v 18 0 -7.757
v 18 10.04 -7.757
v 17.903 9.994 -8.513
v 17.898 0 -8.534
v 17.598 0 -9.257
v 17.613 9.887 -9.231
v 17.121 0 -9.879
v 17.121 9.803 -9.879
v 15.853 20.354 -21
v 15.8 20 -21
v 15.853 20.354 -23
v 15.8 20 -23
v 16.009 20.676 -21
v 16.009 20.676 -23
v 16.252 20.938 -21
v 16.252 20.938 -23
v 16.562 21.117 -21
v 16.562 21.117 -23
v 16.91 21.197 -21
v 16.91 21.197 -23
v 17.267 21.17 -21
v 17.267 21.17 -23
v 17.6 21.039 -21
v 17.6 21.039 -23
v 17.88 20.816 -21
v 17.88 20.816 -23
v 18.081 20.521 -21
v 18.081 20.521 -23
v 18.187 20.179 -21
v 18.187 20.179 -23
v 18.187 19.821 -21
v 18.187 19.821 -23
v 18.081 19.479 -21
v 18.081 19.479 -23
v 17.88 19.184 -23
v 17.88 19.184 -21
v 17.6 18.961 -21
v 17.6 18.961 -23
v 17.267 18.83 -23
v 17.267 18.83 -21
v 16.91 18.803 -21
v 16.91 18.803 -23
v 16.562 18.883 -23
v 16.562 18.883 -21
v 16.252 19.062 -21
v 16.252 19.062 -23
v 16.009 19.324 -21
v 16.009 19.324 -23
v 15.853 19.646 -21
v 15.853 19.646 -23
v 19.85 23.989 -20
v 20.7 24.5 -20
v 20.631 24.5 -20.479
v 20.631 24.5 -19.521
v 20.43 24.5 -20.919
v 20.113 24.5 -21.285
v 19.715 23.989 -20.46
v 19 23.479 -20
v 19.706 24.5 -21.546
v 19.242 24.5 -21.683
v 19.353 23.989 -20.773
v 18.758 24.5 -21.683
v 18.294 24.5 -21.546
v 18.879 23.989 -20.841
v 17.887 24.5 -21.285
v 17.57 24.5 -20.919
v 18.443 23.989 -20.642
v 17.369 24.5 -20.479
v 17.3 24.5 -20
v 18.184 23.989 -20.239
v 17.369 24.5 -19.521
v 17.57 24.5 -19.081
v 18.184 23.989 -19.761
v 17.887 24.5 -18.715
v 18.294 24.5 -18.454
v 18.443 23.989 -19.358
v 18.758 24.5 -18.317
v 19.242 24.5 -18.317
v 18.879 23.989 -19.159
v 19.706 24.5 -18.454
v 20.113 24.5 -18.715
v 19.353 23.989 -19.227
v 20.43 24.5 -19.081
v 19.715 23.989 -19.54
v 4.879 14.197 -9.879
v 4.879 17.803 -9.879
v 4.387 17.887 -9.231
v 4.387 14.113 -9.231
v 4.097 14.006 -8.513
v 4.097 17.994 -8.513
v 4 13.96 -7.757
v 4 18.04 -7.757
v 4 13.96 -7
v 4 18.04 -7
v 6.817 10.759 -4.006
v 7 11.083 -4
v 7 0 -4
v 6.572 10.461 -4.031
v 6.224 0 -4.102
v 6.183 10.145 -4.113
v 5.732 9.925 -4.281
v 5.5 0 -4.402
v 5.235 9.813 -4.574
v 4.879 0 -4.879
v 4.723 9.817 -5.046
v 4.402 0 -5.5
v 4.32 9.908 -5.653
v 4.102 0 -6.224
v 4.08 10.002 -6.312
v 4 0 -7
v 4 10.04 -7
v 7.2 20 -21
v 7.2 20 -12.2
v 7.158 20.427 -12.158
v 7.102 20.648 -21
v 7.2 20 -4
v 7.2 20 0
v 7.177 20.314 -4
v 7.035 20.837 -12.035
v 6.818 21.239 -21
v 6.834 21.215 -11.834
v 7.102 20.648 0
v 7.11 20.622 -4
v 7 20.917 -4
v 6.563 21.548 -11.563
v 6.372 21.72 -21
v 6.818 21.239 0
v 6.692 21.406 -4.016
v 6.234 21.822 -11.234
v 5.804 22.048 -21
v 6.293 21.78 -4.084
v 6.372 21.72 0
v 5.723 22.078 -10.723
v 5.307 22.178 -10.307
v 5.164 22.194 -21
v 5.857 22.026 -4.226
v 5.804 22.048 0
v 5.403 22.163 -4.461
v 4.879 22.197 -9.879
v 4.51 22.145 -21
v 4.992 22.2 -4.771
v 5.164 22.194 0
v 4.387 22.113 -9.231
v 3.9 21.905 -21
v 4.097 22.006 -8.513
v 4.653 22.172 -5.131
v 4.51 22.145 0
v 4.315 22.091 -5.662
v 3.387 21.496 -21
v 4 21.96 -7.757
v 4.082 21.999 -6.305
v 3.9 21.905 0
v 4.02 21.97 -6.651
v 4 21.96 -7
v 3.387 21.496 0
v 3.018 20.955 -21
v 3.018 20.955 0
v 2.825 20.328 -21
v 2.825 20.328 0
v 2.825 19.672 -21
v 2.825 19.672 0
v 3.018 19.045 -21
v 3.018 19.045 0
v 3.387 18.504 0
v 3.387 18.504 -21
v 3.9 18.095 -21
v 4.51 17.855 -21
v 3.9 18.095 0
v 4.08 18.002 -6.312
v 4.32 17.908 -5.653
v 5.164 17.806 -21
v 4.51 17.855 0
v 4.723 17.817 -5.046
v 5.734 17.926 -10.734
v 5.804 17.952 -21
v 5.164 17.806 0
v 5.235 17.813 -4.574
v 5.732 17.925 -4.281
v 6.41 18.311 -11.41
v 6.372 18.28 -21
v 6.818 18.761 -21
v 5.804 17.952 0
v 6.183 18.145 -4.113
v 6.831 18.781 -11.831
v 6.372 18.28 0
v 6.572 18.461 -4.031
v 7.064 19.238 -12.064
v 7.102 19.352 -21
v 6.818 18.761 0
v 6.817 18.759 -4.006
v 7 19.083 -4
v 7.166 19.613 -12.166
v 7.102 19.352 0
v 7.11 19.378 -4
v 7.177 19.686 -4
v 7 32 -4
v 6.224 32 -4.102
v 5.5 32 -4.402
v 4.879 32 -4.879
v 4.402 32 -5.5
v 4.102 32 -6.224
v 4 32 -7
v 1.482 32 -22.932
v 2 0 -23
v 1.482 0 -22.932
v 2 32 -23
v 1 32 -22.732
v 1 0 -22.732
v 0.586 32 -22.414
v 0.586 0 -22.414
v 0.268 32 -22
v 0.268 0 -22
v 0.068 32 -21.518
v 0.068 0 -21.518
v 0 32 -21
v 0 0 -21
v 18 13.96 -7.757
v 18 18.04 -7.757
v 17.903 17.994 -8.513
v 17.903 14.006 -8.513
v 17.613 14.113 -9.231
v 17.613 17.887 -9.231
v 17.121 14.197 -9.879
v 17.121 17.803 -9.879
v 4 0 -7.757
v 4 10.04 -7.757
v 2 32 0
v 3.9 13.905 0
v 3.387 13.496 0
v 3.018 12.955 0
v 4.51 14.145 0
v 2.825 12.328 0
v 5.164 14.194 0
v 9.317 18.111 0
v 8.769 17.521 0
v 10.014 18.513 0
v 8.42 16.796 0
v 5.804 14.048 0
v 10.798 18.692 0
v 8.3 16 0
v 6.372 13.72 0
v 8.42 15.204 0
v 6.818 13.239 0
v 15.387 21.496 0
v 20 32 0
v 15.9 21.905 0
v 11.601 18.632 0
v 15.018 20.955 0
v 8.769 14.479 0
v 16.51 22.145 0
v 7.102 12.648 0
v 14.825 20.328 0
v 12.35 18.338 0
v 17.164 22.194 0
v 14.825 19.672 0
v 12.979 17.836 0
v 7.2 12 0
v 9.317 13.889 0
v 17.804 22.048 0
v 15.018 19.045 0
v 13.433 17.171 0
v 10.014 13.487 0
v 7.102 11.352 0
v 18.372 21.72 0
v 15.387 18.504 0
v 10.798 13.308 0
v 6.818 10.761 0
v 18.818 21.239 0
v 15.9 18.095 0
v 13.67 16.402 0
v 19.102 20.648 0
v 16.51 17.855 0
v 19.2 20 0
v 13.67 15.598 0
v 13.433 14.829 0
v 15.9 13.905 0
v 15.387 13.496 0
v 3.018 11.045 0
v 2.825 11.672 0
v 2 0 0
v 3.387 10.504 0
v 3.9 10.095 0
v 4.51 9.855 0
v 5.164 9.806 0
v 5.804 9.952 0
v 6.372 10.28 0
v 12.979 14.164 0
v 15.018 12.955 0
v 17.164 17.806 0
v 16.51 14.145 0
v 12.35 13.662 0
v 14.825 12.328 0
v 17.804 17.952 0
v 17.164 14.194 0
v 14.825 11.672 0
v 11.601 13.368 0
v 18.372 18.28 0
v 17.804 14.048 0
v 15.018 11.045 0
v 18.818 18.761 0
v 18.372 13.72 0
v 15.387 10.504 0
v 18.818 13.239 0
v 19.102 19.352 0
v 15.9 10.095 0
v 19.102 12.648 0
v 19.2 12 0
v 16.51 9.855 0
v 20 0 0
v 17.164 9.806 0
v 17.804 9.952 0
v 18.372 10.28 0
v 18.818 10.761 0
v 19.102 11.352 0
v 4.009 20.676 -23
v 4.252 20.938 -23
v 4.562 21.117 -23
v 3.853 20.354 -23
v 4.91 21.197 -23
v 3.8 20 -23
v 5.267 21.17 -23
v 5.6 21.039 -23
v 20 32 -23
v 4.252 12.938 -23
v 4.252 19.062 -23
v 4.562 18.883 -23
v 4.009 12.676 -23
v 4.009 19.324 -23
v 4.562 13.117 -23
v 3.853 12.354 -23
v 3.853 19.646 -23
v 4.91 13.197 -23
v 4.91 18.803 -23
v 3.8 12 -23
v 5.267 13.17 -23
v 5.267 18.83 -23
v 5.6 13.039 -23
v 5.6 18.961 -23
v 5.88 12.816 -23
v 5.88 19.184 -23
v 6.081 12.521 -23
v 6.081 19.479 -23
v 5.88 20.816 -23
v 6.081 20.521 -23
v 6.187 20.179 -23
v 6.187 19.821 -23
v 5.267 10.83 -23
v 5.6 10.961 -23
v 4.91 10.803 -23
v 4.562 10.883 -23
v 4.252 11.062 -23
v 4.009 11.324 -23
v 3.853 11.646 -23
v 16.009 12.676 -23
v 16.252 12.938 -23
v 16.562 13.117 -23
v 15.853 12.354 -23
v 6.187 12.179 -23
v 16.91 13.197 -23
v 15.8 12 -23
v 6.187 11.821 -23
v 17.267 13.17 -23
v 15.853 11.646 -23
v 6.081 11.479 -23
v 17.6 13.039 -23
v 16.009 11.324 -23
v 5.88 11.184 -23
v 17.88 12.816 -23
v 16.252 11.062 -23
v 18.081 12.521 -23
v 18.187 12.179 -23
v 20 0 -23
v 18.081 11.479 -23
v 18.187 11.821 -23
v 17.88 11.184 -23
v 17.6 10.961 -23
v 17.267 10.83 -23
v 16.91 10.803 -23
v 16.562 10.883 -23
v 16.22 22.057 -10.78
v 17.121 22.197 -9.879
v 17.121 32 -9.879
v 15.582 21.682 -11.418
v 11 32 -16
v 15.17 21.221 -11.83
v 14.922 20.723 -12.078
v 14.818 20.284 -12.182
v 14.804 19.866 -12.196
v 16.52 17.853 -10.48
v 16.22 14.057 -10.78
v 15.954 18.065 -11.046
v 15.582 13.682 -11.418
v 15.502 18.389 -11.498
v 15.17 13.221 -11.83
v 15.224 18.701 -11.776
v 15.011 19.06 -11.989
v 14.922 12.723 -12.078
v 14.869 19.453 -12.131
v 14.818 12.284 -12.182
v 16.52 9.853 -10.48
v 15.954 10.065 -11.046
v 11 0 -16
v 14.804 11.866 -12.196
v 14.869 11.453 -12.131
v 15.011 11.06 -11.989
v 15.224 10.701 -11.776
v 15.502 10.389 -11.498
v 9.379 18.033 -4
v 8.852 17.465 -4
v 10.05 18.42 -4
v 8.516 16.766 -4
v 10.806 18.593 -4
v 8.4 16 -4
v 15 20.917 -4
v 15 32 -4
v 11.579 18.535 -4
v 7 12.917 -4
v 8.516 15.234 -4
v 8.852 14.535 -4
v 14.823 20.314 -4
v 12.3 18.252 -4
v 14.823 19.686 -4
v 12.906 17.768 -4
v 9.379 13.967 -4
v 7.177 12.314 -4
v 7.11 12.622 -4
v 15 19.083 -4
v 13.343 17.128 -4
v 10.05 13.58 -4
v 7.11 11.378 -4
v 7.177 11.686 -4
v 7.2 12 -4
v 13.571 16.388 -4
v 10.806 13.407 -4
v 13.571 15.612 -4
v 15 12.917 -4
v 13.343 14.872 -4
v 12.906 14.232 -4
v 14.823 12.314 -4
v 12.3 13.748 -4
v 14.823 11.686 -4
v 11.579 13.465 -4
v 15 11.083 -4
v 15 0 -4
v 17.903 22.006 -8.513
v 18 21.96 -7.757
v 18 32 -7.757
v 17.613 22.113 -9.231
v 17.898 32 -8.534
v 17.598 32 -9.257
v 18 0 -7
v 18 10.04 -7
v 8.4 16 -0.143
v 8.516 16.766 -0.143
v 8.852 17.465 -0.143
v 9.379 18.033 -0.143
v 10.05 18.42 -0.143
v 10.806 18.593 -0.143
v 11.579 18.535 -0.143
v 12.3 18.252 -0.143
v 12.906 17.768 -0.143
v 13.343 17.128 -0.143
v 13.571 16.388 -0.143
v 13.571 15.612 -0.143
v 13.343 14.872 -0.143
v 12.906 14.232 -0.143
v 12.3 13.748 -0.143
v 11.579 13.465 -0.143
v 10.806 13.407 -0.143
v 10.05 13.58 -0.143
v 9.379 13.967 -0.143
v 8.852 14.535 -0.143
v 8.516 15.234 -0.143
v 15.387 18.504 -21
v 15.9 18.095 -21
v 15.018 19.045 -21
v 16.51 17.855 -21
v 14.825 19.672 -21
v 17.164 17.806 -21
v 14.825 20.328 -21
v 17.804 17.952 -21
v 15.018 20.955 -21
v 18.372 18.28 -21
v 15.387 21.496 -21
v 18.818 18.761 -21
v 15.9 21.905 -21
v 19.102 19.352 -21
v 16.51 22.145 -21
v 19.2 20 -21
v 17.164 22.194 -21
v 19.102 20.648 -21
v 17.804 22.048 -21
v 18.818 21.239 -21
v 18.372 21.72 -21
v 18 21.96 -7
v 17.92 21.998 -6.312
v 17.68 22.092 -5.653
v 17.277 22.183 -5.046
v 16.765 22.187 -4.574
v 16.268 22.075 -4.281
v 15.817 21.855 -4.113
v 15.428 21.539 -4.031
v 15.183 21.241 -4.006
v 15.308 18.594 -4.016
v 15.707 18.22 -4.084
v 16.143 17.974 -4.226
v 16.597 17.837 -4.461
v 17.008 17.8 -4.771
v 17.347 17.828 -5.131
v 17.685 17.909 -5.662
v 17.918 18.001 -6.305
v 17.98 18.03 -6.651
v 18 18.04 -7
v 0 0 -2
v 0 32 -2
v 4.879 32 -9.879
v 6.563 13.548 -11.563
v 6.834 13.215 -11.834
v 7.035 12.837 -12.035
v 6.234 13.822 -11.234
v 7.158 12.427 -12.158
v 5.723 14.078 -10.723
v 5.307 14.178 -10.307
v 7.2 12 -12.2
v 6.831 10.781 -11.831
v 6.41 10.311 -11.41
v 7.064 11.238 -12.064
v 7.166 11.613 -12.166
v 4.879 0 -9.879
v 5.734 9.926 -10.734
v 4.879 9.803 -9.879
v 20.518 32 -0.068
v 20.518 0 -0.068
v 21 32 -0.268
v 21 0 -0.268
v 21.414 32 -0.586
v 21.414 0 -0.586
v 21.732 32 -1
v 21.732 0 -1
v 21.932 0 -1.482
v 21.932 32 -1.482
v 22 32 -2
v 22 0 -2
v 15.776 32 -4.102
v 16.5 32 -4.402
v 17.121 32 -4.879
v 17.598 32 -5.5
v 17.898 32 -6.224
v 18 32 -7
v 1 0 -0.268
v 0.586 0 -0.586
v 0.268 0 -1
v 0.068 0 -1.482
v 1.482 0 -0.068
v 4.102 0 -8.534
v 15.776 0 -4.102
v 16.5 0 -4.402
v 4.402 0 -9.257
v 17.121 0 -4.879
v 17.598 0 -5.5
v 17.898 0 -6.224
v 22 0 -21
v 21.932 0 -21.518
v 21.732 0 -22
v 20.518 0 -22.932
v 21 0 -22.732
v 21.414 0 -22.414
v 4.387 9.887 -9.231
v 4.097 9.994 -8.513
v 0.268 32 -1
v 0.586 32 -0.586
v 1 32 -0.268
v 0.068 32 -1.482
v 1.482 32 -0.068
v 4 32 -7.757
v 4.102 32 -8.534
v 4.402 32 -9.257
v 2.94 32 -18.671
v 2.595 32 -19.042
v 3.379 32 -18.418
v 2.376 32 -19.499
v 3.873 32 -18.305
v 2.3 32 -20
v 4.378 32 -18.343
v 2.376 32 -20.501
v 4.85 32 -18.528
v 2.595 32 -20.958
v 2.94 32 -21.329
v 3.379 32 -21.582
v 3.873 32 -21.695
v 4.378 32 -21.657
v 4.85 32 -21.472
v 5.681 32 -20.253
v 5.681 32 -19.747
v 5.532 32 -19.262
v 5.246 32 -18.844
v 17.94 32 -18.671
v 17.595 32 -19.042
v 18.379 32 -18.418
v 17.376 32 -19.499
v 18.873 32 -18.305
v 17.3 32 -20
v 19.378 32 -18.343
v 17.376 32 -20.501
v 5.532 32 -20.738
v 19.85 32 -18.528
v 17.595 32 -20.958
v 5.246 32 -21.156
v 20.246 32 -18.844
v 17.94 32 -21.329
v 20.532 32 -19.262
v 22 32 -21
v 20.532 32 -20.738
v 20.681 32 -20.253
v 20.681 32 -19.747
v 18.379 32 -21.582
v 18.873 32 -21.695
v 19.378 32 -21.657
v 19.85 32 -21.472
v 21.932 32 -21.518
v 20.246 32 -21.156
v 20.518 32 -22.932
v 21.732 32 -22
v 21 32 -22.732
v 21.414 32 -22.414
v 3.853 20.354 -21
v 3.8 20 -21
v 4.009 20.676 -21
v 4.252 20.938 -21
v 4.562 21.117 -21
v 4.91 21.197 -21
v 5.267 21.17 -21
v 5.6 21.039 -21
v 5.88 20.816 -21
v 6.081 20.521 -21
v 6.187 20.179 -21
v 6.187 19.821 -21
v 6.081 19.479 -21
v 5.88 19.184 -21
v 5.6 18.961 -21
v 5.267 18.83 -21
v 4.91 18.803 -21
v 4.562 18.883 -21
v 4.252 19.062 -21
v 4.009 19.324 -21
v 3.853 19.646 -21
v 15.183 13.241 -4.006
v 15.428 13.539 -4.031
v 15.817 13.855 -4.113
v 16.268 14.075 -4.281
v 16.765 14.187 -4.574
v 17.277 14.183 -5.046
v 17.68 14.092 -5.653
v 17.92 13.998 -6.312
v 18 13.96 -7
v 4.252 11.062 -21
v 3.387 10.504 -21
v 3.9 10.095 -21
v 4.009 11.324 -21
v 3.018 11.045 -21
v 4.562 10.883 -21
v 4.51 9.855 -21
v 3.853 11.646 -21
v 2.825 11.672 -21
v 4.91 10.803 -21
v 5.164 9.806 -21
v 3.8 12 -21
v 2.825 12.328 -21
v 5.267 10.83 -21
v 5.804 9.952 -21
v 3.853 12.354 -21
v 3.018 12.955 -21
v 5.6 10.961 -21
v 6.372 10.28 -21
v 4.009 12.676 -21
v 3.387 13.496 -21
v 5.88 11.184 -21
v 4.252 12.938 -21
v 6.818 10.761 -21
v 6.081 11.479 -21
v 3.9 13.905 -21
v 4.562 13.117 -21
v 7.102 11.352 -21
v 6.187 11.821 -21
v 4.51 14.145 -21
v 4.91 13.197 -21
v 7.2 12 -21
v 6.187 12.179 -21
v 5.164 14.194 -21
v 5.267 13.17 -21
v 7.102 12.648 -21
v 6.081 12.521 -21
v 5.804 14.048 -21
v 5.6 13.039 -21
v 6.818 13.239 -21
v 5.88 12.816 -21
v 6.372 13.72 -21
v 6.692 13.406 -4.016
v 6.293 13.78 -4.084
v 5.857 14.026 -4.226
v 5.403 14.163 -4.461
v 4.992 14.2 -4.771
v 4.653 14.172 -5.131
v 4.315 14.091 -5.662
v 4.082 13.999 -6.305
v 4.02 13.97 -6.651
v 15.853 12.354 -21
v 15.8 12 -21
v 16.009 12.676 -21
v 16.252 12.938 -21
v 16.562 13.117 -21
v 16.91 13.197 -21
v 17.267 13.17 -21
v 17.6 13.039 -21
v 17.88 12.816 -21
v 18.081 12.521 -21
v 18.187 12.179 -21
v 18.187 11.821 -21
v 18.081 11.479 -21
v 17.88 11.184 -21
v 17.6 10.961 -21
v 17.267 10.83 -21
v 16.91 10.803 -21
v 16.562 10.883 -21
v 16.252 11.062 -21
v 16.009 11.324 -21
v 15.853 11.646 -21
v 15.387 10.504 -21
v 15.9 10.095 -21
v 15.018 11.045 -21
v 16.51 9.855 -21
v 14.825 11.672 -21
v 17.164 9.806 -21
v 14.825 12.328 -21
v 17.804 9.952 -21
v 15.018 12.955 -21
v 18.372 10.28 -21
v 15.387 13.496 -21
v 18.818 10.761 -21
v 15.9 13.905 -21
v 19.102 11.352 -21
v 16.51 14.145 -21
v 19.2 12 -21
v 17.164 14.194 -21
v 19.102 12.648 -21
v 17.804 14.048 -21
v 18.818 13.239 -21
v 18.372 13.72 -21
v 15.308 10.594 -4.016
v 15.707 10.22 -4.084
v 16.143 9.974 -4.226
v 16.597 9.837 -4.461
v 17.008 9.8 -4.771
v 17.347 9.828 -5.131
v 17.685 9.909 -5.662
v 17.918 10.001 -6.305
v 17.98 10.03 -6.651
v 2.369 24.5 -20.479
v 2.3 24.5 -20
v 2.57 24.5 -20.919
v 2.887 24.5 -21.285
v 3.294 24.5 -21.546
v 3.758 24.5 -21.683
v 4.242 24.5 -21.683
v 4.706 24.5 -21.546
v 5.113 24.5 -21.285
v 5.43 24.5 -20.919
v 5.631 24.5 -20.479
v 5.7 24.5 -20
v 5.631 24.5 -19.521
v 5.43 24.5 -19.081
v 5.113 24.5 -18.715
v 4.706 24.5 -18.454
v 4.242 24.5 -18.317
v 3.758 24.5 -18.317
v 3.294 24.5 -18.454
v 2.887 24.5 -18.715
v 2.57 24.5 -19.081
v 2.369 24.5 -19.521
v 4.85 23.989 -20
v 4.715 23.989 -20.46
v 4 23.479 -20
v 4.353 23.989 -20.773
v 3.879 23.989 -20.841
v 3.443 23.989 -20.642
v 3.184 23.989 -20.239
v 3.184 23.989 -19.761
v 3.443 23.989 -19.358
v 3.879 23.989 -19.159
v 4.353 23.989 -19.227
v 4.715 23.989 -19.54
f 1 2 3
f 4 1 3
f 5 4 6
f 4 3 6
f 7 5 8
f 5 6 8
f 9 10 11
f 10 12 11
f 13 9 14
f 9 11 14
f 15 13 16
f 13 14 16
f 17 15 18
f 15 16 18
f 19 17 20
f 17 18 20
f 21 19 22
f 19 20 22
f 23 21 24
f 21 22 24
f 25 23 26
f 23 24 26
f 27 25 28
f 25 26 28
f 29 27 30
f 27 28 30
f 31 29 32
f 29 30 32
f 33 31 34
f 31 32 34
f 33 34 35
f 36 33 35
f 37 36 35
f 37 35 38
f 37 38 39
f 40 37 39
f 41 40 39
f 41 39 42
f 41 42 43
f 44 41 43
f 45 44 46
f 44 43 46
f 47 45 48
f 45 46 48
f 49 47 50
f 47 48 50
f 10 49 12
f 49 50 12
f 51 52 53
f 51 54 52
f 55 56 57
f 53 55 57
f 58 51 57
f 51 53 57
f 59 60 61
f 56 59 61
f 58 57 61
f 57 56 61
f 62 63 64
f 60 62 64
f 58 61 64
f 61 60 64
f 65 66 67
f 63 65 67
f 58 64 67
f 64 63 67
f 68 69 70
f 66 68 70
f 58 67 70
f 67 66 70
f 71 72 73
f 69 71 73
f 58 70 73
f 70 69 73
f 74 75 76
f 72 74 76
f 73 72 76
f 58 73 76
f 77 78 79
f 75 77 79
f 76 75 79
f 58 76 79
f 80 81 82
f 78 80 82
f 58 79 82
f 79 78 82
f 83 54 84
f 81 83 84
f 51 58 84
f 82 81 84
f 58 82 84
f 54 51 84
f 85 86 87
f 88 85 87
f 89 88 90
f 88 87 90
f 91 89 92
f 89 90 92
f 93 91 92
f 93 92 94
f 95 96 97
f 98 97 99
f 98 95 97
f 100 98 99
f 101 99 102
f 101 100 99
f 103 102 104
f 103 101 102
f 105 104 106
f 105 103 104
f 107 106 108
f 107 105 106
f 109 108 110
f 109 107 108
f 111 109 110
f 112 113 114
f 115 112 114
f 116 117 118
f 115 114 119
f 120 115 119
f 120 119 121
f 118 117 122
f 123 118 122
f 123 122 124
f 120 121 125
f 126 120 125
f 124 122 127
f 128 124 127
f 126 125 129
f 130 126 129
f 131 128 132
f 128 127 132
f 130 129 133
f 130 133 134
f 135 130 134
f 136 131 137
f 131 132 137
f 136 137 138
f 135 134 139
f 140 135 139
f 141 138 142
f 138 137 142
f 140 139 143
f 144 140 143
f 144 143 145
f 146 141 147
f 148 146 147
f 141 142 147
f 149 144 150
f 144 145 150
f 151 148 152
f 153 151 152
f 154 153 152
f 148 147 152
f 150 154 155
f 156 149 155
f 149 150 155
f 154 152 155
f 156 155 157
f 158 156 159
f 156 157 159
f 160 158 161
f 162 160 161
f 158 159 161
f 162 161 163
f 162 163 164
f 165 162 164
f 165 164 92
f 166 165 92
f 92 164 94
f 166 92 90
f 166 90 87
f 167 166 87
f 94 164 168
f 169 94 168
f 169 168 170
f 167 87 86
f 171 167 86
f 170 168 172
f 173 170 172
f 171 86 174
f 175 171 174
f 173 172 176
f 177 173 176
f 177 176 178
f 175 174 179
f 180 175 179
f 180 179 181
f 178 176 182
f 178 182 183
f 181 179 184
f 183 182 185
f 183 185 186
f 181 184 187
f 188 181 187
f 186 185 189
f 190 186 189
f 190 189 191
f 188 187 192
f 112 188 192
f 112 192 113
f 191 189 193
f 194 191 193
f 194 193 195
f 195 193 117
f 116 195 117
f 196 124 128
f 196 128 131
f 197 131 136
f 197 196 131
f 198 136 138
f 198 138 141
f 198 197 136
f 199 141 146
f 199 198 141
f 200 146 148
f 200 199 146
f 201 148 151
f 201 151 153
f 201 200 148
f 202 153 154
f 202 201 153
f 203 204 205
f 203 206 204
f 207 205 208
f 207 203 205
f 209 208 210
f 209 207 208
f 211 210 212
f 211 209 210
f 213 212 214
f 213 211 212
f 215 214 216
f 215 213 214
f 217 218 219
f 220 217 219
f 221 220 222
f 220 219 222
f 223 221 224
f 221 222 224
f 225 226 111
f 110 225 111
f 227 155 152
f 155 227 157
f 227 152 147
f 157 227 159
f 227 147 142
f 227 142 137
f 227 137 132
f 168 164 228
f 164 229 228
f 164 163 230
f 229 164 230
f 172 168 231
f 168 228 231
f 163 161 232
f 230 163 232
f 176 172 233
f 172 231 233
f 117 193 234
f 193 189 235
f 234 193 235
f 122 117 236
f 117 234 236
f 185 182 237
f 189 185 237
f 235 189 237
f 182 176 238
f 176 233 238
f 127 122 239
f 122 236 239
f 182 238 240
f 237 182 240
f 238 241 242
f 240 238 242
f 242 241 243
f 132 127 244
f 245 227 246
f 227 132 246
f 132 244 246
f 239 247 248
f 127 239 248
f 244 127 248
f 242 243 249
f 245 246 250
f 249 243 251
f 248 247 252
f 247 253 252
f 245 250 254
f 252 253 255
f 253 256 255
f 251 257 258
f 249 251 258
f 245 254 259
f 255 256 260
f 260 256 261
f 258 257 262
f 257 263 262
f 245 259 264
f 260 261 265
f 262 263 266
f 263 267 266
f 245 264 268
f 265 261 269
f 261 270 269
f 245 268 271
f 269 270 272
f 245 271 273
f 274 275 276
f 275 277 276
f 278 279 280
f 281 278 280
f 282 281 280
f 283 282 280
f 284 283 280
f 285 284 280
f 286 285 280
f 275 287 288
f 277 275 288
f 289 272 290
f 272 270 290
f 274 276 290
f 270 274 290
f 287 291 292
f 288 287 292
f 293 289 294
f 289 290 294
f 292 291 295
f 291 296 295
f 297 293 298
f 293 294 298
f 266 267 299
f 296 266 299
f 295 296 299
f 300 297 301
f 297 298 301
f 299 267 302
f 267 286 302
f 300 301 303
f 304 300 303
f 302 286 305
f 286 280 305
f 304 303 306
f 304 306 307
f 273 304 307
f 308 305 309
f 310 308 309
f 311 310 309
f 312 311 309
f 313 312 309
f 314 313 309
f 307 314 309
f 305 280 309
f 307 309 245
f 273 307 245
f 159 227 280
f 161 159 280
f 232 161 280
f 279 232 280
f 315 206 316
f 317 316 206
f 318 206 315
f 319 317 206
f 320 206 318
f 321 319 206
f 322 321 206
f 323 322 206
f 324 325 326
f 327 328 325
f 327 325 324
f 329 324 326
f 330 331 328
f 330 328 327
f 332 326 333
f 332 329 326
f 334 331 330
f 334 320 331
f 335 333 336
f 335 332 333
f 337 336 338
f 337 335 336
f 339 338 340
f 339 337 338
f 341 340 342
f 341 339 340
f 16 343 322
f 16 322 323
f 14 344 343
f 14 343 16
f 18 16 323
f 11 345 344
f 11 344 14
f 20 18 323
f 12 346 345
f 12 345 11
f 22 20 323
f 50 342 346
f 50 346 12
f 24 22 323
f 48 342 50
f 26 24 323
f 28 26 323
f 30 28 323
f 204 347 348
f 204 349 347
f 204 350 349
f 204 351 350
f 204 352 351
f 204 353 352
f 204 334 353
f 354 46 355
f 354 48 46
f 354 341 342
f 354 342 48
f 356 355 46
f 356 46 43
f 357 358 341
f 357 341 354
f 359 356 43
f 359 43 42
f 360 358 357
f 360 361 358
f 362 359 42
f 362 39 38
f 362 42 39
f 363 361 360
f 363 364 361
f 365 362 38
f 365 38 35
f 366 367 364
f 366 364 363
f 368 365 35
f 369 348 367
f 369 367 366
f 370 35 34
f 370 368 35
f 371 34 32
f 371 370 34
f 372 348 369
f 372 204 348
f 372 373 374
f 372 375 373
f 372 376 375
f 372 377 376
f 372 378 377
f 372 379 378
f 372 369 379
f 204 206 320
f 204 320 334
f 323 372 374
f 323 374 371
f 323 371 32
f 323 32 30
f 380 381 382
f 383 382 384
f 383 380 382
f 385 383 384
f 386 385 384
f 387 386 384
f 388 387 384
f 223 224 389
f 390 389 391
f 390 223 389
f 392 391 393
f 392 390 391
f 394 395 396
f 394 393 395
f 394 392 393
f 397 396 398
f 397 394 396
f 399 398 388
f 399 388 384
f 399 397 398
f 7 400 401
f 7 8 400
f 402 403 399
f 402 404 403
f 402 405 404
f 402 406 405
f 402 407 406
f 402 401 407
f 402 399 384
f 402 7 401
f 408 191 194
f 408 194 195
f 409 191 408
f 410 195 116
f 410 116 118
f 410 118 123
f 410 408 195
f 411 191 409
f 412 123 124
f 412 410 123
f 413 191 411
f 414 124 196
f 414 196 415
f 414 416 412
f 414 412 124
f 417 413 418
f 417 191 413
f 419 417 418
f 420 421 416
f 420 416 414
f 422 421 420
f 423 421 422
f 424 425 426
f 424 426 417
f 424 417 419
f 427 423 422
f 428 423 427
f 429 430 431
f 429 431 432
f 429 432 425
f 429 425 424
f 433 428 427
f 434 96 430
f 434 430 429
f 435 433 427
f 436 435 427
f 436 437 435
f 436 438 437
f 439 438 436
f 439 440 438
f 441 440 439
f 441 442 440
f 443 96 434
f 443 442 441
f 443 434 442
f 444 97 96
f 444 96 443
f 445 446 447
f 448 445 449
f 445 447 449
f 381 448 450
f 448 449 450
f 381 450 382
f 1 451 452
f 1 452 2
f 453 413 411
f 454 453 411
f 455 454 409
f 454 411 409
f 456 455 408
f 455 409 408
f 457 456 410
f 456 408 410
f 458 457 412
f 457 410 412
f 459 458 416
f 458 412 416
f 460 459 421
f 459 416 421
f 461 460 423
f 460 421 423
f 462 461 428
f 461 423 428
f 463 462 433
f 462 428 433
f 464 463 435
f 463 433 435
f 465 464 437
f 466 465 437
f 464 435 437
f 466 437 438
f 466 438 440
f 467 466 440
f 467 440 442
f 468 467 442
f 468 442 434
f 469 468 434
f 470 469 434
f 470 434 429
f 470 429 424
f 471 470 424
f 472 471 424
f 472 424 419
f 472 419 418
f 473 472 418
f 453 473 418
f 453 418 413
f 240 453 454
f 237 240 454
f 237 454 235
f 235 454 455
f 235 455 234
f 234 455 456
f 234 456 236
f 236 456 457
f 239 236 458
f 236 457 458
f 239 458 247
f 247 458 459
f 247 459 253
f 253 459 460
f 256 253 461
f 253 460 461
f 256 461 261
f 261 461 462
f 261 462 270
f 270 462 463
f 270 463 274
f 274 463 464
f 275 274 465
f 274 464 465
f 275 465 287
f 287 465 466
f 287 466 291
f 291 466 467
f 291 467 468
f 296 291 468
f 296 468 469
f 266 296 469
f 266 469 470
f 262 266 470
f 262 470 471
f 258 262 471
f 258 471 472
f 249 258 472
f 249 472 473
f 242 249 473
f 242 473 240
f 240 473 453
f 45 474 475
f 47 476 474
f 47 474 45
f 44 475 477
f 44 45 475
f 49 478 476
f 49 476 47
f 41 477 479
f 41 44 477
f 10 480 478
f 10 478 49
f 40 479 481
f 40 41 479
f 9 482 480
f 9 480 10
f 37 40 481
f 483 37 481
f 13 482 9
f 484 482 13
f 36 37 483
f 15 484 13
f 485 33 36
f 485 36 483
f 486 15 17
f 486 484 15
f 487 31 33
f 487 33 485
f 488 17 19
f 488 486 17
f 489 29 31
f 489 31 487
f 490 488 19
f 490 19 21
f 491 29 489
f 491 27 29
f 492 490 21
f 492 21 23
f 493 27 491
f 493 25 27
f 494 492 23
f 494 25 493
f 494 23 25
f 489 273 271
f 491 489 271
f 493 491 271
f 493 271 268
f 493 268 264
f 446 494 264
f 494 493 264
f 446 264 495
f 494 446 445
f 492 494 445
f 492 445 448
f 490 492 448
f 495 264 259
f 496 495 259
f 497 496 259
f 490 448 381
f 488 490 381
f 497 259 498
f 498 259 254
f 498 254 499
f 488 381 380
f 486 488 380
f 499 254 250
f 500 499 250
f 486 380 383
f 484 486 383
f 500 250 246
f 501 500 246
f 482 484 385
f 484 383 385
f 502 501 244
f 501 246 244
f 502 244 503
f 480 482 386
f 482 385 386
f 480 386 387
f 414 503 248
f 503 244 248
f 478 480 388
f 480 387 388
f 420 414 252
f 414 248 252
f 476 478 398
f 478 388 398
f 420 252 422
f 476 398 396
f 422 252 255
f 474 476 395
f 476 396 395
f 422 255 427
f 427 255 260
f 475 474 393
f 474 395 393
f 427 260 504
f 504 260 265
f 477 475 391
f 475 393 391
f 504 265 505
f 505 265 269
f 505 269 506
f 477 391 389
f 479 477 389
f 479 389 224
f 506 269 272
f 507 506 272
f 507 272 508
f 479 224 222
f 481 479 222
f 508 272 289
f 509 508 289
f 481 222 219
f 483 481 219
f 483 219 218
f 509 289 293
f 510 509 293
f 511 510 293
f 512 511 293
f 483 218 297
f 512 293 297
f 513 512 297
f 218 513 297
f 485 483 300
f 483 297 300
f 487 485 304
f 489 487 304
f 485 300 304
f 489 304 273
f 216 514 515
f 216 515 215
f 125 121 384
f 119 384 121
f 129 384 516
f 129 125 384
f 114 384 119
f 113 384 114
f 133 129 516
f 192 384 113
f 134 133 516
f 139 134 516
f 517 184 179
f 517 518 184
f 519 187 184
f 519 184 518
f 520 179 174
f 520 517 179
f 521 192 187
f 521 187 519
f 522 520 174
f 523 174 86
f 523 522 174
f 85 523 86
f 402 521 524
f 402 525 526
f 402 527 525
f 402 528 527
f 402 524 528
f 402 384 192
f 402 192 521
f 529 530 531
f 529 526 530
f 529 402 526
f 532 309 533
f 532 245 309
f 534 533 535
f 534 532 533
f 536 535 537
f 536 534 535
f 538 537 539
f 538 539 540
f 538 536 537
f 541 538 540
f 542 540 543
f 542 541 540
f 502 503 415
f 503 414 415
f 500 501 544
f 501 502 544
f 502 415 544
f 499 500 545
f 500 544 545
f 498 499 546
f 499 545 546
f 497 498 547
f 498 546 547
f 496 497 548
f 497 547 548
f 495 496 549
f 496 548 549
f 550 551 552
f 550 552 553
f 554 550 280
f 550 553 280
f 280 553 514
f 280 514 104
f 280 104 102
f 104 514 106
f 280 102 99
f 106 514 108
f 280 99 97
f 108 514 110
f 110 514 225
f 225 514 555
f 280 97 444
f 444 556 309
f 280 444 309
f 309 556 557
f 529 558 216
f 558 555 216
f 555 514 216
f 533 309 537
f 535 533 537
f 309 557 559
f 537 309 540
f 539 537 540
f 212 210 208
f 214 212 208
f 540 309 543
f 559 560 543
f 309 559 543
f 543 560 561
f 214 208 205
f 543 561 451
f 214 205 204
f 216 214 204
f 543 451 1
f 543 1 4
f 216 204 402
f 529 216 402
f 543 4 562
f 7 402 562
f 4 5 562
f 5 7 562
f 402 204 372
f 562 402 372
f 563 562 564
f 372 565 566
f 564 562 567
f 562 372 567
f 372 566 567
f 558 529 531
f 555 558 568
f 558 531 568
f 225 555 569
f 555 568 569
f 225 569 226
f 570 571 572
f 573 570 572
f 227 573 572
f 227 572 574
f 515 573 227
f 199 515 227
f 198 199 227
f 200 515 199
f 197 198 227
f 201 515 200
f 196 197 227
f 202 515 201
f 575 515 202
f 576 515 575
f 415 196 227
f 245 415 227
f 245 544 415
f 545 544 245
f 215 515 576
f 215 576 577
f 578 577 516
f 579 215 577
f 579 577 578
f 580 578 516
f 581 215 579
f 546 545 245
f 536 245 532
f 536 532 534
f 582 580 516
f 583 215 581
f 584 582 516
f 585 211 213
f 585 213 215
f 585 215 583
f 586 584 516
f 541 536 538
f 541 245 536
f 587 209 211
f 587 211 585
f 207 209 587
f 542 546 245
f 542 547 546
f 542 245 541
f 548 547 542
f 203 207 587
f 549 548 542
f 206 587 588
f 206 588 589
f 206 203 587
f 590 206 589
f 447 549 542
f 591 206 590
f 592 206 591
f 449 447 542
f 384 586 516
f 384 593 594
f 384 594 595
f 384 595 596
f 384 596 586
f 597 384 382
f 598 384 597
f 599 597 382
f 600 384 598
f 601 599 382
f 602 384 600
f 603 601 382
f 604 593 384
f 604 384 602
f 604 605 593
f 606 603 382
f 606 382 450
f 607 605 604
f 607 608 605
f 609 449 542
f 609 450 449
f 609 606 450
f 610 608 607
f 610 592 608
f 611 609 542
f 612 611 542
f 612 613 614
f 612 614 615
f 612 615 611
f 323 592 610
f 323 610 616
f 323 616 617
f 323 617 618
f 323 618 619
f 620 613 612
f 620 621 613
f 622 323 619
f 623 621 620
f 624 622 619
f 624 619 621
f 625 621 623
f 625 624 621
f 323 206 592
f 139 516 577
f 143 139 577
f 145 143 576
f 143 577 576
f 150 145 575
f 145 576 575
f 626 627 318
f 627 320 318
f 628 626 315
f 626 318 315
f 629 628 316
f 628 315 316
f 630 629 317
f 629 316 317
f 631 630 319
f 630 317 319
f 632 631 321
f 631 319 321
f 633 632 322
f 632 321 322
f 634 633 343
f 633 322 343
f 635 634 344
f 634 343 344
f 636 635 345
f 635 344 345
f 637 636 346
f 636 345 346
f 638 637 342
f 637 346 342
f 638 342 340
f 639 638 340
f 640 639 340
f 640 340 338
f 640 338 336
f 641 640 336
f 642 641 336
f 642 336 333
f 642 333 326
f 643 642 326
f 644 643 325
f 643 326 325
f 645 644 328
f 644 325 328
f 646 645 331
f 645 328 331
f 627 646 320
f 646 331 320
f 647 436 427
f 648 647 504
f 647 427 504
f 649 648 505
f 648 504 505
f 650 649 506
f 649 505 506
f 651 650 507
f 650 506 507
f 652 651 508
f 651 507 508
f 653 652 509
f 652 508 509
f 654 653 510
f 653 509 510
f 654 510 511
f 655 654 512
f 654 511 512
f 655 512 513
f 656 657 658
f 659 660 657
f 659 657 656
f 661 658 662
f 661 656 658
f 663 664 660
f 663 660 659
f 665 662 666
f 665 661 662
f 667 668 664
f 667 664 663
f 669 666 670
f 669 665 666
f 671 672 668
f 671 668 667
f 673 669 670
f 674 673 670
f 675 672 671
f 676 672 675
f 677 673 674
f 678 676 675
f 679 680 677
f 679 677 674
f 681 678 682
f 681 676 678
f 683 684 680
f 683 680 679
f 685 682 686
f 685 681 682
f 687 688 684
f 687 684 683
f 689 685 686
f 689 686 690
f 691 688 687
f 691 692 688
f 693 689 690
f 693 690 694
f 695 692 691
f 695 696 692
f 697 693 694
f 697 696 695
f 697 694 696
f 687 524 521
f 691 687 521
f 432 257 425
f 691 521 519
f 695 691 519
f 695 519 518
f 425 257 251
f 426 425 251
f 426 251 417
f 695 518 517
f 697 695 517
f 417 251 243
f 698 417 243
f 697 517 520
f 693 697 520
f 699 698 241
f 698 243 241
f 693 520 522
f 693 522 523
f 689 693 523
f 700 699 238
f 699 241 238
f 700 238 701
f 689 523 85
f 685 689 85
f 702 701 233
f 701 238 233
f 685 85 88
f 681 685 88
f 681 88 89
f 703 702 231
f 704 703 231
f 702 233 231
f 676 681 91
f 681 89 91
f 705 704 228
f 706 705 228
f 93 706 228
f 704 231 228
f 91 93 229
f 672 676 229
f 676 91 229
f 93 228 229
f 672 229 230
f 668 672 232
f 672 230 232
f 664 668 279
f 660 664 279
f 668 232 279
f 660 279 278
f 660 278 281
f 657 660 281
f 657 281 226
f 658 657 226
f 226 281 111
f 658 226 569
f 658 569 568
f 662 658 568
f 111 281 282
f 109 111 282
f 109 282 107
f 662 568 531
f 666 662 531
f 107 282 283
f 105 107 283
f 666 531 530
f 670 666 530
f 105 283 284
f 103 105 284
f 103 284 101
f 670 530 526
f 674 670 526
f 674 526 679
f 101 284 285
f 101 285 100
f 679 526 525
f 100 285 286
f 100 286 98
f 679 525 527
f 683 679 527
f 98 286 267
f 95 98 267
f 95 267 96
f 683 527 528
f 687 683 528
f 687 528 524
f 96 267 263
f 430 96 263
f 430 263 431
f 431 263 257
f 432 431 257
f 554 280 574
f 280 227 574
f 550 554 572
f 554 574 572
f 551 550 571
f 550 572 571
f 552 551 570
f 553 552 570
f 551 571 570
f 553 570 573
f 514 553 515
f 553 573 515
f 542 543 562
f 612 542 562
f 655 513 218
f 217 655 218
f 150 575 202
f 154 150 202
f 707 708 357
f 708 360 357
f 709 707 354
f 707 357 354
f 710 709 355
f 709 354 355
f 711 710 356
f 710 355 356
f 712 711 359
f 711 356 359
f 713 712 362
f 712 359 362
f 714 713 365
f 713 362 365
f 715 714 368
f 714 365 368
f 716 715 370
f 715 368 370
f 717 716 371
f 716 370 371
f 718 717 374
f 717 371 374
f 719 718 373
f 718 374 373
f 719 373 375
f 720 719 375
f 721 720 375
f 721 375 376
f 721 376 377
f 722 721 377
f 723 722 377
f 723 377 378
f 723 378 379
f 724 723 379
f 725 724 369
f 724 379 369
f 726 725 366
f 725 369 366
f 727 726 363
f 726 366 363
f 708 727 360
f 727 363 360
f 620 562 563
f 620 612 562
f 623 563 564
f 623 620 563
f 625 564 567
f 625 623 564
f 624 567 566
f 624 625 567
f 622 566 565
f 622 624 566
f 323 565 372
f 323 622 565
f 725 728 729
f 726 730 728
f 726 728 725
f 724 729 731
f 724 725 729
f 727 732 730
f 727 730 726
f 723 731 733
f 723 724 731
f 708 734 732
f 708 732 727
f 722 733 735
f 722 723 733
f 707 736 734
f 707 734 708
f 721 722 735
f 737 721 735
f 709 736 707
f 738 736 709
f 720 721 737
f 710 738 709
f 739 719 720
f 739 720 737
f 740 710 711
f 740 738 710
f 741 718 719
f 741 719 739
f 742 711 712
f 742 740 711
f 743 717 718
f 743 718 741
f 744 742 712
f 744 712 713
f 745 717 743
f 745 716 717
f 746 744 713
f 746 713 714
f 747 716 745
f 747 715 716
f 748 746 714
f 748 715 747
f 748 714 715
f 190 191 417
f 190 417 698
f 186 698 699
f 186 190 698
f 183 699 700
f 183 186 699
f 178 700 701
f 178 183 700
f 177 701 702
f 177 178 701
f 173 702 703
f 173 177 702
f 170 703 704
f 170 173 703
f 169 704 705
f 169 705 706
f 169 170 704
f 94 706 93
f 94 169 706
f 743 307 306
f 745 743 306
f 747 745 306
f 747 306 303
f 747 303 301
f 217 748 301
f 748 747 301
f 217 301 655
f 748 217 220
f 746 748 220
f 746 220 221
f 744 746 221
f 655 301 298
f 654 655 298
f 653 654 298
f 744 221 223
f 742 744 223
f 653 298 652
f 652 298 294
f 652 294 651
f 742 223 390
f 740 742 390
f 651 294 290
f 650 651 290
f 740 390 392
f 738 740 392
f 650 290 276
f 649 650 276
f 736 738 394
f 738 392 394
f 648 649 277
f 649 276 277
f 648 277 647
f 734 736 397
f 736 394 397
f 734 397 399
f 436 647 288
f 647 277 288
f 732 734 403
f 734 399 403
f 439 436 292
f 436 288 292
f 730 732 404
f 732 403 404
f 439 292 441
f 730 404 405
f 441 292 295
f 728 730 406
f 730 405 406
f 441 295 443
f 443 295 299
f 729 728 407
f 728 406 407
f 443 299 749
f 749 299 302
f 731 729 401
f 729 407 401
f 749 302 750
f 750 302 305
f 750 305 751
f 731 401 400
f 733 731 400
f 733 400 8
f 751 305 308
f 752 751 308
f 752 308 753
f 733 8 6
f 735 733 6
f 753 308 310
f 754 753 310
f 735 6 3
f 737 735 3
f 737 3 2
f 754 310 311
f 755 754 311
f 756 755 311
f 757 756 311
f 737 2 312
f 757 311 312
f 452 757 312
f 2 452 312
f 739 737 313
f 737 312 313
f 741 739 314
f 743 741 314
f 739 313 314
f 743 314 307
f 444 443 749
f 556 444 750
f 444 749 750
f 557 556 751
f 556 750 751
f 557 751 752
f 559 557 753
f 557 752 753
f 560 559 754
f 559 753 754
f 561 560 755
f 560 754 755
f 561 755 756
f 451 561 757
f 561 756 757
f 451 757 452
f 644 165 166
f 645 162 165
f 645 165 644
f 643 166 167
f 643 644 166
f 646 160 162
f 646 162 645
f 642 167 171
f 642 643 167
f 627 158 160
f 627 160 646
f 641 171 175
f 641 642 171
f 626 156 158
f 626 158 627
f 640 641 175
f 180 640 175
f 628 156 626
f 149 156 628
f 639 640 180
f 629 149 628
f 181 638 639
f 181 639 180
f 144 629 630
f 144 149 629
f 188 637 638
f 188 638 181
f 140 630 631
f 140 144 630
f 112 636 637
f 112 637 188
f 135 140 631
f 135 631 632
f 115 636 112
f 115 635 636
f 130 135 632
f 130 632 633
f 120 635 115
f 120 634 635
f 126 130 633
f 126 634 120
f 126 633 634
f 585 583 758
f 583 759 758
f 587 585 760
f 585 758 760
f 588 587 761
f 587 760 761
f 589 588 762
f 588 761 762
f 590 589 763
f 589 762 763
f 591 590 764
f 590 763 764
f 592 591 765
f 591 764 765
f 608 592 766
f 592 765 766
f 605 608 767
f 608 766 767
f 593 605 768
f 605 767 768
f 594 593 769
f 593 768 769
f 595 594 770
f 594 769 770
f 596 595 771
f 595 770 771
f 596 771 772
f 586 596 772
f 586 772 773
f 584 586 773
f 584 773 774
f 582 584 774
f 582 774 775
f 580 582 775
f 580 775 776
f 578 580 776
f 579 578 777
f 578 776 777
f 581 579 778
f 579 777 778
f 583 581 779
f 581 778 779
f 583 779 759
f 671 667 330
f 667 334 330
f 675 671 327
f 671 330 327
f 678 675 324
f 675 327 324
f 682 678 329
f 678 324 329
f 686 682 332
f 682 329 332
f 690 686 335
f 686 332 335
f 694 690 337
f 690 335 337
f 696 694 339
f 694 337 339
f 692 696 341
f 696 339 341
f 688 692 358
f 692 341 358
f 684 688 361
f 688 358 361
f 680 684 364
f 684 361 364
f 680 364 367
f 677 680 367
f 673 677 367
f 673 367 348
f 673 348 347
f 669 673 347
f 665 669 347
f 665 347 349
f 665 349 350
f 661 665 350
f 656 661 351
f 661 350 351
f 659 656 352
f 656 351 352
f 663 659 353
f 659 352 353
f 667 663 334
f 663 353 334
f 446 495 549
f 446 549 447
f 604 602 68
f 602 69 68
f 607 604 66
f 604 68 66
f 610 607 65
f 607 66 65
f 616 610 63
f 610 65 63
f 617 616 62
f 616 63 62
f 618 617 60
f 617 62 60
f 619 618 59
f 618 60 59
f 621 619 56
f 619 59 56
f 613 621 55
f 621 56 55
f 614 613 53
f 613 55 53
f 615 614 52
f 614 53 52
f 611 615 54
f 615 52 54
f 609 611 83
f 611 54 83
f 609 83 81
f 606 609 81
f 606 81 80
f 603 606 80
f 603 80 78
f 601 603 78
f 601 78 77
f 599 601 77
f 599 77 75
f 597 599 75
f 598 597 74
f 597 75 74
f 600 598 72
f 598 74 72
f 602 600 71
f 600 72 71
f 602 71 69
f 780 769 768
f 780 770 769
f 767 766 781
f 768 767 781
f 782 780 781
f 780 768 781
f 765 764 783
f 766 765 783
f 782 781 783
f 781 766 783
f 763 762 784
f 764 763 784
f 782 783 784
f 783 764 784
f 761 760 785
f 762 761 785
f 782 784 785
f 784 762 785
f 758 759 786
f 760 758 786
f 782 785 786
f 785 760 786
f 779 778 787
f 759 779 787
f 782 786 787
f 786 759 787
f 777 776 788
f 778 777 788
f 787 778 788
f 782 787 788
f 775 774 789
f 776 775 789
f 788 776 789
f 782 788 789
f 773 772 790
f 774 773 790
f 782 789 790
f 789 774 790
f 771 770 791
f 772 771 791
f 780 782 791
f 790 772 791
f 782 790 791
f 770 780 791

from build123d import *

# Parameters (mm, degrees)
SKETCH1_W                       = 22
SKETCH1_H                       = 23
BOSS_EXTRUDE1_DEPTH             = 32
FILLET1_R                       = 3
CBORE_FOR_M2_SHCS1_D            = 2.4
CBORE_FOR_M2_SHCS1_CBORE_D      = 4.4
CBORE_FOR_M2_SHCS1_CBORE_DEPTH  = 21
F_5_0MM_DOWEL_HOLE1_D           = 5.2
F_5_0MM_DOWEL_HOLE1_DEPTH       = 4
F_5_0MM_DOWEL_HOLE1_CSINK_D     = 5.4
F_5_0MM_DOWEL_HOLE1_CSINK_ANGLE = 70
FILLET2_R                       = 2
M3_CLEARANCE_HOLE1_D            = 3.4
M3_CLEARANCE_HOLE1_DEPTH        = 7.5
M3_CLEARANCE_HOLE1_TIP          = 1.021463052


with BuildPart() as part:
    # Sketch1 → Boss-Extrude1 (new body)
    with BuildSketch(Plane(origin=(0, 0, 0), x_dir=(1, 0, 0), z_dir=(0, 1, 0))):
        with Locations((11, 11.5)):
            Rectangle(SKETCH1_W, SKETCH1_H)
        Polygon((4, 4), (18, 4), (18, 9), (11, 16), (4, 9), align=None, mode=Mode.SUBTRACT)
    extrude(amount=BOSS_EXTRUDE1_DEPTH)

    # Fillet1
    fillet1_edges = [part.edges().sort_by_distance(p)[0] for p in [
        (4, 16, -9),
        (4, 16, -4),
        (18, 16, -4),
        (18, 16, -9),
    ]]
    fillet(fillet1_edges, radius=FILLET1_R)

    # CBORE for M2 SHCS1 (through all)
    with Locations(Plane.XY):
        with Locations((5, 12), (17, 12), (17, 20), (5, 20)):
            CounterBoreHole(CBORE_FOR_M2_SHCS1_D / 2, CBORE_FOR_M2_SHCS1_CBORE_D / 2, CBORE_FOR_M2_SHCS1_CBORE_DEPTH)

    # Ø5.0mm Dowel Hole1
    with Locations(Plane.XY):
        with Locations((11, 16)):
            CounterSinkHole(F_5_0MM_DOWEL_HOLE1_D / 2, F_5_0MM_DOWEL_HOLE1_CSINK_D / 2, depth=F_5_0MM_DOWEL_HOLE1_DEPTH, counter_sink_angle=F_5_0MM_DOWEL_HOLE1_CSINK_ANGLE)

    # Fillet2
    fillet2_edges = [part.edges().sort_by_distance(p)[0] for p in [
        (0, 16, 0),
        (0, 16, -23),
        (22, 16, -23),
        (22, 16, 0),
    ]]
    fillet(fillet2_edges, radius=FILLET2_R)

    # M3 Clearance Hole1
    with Locations(Plane(origin=(0, 32, 0), x_dir=(1, 0, 0), z_dir=(0, 1, 0))):
        with Locations((4, 20), (19, 20)):
            Hole(M3_CLEARANCE_HOLE1_D / 2, depth=M3_CLEARANCE_HOLE1_DEPTH)
            with Locations((0, 0, -(M3_CLEARANCE_HOLE1_DEPTH + M3_CLEARANCE_HOLE1_TIP / 2))):  # 118° drill point
                Cone(0, M3_CLEARANCE_HOLE1_D / 2, M3_CLEARANCE_HOLE1_TIP, mode=Mode.SUBTRACT)


solid = part.part
